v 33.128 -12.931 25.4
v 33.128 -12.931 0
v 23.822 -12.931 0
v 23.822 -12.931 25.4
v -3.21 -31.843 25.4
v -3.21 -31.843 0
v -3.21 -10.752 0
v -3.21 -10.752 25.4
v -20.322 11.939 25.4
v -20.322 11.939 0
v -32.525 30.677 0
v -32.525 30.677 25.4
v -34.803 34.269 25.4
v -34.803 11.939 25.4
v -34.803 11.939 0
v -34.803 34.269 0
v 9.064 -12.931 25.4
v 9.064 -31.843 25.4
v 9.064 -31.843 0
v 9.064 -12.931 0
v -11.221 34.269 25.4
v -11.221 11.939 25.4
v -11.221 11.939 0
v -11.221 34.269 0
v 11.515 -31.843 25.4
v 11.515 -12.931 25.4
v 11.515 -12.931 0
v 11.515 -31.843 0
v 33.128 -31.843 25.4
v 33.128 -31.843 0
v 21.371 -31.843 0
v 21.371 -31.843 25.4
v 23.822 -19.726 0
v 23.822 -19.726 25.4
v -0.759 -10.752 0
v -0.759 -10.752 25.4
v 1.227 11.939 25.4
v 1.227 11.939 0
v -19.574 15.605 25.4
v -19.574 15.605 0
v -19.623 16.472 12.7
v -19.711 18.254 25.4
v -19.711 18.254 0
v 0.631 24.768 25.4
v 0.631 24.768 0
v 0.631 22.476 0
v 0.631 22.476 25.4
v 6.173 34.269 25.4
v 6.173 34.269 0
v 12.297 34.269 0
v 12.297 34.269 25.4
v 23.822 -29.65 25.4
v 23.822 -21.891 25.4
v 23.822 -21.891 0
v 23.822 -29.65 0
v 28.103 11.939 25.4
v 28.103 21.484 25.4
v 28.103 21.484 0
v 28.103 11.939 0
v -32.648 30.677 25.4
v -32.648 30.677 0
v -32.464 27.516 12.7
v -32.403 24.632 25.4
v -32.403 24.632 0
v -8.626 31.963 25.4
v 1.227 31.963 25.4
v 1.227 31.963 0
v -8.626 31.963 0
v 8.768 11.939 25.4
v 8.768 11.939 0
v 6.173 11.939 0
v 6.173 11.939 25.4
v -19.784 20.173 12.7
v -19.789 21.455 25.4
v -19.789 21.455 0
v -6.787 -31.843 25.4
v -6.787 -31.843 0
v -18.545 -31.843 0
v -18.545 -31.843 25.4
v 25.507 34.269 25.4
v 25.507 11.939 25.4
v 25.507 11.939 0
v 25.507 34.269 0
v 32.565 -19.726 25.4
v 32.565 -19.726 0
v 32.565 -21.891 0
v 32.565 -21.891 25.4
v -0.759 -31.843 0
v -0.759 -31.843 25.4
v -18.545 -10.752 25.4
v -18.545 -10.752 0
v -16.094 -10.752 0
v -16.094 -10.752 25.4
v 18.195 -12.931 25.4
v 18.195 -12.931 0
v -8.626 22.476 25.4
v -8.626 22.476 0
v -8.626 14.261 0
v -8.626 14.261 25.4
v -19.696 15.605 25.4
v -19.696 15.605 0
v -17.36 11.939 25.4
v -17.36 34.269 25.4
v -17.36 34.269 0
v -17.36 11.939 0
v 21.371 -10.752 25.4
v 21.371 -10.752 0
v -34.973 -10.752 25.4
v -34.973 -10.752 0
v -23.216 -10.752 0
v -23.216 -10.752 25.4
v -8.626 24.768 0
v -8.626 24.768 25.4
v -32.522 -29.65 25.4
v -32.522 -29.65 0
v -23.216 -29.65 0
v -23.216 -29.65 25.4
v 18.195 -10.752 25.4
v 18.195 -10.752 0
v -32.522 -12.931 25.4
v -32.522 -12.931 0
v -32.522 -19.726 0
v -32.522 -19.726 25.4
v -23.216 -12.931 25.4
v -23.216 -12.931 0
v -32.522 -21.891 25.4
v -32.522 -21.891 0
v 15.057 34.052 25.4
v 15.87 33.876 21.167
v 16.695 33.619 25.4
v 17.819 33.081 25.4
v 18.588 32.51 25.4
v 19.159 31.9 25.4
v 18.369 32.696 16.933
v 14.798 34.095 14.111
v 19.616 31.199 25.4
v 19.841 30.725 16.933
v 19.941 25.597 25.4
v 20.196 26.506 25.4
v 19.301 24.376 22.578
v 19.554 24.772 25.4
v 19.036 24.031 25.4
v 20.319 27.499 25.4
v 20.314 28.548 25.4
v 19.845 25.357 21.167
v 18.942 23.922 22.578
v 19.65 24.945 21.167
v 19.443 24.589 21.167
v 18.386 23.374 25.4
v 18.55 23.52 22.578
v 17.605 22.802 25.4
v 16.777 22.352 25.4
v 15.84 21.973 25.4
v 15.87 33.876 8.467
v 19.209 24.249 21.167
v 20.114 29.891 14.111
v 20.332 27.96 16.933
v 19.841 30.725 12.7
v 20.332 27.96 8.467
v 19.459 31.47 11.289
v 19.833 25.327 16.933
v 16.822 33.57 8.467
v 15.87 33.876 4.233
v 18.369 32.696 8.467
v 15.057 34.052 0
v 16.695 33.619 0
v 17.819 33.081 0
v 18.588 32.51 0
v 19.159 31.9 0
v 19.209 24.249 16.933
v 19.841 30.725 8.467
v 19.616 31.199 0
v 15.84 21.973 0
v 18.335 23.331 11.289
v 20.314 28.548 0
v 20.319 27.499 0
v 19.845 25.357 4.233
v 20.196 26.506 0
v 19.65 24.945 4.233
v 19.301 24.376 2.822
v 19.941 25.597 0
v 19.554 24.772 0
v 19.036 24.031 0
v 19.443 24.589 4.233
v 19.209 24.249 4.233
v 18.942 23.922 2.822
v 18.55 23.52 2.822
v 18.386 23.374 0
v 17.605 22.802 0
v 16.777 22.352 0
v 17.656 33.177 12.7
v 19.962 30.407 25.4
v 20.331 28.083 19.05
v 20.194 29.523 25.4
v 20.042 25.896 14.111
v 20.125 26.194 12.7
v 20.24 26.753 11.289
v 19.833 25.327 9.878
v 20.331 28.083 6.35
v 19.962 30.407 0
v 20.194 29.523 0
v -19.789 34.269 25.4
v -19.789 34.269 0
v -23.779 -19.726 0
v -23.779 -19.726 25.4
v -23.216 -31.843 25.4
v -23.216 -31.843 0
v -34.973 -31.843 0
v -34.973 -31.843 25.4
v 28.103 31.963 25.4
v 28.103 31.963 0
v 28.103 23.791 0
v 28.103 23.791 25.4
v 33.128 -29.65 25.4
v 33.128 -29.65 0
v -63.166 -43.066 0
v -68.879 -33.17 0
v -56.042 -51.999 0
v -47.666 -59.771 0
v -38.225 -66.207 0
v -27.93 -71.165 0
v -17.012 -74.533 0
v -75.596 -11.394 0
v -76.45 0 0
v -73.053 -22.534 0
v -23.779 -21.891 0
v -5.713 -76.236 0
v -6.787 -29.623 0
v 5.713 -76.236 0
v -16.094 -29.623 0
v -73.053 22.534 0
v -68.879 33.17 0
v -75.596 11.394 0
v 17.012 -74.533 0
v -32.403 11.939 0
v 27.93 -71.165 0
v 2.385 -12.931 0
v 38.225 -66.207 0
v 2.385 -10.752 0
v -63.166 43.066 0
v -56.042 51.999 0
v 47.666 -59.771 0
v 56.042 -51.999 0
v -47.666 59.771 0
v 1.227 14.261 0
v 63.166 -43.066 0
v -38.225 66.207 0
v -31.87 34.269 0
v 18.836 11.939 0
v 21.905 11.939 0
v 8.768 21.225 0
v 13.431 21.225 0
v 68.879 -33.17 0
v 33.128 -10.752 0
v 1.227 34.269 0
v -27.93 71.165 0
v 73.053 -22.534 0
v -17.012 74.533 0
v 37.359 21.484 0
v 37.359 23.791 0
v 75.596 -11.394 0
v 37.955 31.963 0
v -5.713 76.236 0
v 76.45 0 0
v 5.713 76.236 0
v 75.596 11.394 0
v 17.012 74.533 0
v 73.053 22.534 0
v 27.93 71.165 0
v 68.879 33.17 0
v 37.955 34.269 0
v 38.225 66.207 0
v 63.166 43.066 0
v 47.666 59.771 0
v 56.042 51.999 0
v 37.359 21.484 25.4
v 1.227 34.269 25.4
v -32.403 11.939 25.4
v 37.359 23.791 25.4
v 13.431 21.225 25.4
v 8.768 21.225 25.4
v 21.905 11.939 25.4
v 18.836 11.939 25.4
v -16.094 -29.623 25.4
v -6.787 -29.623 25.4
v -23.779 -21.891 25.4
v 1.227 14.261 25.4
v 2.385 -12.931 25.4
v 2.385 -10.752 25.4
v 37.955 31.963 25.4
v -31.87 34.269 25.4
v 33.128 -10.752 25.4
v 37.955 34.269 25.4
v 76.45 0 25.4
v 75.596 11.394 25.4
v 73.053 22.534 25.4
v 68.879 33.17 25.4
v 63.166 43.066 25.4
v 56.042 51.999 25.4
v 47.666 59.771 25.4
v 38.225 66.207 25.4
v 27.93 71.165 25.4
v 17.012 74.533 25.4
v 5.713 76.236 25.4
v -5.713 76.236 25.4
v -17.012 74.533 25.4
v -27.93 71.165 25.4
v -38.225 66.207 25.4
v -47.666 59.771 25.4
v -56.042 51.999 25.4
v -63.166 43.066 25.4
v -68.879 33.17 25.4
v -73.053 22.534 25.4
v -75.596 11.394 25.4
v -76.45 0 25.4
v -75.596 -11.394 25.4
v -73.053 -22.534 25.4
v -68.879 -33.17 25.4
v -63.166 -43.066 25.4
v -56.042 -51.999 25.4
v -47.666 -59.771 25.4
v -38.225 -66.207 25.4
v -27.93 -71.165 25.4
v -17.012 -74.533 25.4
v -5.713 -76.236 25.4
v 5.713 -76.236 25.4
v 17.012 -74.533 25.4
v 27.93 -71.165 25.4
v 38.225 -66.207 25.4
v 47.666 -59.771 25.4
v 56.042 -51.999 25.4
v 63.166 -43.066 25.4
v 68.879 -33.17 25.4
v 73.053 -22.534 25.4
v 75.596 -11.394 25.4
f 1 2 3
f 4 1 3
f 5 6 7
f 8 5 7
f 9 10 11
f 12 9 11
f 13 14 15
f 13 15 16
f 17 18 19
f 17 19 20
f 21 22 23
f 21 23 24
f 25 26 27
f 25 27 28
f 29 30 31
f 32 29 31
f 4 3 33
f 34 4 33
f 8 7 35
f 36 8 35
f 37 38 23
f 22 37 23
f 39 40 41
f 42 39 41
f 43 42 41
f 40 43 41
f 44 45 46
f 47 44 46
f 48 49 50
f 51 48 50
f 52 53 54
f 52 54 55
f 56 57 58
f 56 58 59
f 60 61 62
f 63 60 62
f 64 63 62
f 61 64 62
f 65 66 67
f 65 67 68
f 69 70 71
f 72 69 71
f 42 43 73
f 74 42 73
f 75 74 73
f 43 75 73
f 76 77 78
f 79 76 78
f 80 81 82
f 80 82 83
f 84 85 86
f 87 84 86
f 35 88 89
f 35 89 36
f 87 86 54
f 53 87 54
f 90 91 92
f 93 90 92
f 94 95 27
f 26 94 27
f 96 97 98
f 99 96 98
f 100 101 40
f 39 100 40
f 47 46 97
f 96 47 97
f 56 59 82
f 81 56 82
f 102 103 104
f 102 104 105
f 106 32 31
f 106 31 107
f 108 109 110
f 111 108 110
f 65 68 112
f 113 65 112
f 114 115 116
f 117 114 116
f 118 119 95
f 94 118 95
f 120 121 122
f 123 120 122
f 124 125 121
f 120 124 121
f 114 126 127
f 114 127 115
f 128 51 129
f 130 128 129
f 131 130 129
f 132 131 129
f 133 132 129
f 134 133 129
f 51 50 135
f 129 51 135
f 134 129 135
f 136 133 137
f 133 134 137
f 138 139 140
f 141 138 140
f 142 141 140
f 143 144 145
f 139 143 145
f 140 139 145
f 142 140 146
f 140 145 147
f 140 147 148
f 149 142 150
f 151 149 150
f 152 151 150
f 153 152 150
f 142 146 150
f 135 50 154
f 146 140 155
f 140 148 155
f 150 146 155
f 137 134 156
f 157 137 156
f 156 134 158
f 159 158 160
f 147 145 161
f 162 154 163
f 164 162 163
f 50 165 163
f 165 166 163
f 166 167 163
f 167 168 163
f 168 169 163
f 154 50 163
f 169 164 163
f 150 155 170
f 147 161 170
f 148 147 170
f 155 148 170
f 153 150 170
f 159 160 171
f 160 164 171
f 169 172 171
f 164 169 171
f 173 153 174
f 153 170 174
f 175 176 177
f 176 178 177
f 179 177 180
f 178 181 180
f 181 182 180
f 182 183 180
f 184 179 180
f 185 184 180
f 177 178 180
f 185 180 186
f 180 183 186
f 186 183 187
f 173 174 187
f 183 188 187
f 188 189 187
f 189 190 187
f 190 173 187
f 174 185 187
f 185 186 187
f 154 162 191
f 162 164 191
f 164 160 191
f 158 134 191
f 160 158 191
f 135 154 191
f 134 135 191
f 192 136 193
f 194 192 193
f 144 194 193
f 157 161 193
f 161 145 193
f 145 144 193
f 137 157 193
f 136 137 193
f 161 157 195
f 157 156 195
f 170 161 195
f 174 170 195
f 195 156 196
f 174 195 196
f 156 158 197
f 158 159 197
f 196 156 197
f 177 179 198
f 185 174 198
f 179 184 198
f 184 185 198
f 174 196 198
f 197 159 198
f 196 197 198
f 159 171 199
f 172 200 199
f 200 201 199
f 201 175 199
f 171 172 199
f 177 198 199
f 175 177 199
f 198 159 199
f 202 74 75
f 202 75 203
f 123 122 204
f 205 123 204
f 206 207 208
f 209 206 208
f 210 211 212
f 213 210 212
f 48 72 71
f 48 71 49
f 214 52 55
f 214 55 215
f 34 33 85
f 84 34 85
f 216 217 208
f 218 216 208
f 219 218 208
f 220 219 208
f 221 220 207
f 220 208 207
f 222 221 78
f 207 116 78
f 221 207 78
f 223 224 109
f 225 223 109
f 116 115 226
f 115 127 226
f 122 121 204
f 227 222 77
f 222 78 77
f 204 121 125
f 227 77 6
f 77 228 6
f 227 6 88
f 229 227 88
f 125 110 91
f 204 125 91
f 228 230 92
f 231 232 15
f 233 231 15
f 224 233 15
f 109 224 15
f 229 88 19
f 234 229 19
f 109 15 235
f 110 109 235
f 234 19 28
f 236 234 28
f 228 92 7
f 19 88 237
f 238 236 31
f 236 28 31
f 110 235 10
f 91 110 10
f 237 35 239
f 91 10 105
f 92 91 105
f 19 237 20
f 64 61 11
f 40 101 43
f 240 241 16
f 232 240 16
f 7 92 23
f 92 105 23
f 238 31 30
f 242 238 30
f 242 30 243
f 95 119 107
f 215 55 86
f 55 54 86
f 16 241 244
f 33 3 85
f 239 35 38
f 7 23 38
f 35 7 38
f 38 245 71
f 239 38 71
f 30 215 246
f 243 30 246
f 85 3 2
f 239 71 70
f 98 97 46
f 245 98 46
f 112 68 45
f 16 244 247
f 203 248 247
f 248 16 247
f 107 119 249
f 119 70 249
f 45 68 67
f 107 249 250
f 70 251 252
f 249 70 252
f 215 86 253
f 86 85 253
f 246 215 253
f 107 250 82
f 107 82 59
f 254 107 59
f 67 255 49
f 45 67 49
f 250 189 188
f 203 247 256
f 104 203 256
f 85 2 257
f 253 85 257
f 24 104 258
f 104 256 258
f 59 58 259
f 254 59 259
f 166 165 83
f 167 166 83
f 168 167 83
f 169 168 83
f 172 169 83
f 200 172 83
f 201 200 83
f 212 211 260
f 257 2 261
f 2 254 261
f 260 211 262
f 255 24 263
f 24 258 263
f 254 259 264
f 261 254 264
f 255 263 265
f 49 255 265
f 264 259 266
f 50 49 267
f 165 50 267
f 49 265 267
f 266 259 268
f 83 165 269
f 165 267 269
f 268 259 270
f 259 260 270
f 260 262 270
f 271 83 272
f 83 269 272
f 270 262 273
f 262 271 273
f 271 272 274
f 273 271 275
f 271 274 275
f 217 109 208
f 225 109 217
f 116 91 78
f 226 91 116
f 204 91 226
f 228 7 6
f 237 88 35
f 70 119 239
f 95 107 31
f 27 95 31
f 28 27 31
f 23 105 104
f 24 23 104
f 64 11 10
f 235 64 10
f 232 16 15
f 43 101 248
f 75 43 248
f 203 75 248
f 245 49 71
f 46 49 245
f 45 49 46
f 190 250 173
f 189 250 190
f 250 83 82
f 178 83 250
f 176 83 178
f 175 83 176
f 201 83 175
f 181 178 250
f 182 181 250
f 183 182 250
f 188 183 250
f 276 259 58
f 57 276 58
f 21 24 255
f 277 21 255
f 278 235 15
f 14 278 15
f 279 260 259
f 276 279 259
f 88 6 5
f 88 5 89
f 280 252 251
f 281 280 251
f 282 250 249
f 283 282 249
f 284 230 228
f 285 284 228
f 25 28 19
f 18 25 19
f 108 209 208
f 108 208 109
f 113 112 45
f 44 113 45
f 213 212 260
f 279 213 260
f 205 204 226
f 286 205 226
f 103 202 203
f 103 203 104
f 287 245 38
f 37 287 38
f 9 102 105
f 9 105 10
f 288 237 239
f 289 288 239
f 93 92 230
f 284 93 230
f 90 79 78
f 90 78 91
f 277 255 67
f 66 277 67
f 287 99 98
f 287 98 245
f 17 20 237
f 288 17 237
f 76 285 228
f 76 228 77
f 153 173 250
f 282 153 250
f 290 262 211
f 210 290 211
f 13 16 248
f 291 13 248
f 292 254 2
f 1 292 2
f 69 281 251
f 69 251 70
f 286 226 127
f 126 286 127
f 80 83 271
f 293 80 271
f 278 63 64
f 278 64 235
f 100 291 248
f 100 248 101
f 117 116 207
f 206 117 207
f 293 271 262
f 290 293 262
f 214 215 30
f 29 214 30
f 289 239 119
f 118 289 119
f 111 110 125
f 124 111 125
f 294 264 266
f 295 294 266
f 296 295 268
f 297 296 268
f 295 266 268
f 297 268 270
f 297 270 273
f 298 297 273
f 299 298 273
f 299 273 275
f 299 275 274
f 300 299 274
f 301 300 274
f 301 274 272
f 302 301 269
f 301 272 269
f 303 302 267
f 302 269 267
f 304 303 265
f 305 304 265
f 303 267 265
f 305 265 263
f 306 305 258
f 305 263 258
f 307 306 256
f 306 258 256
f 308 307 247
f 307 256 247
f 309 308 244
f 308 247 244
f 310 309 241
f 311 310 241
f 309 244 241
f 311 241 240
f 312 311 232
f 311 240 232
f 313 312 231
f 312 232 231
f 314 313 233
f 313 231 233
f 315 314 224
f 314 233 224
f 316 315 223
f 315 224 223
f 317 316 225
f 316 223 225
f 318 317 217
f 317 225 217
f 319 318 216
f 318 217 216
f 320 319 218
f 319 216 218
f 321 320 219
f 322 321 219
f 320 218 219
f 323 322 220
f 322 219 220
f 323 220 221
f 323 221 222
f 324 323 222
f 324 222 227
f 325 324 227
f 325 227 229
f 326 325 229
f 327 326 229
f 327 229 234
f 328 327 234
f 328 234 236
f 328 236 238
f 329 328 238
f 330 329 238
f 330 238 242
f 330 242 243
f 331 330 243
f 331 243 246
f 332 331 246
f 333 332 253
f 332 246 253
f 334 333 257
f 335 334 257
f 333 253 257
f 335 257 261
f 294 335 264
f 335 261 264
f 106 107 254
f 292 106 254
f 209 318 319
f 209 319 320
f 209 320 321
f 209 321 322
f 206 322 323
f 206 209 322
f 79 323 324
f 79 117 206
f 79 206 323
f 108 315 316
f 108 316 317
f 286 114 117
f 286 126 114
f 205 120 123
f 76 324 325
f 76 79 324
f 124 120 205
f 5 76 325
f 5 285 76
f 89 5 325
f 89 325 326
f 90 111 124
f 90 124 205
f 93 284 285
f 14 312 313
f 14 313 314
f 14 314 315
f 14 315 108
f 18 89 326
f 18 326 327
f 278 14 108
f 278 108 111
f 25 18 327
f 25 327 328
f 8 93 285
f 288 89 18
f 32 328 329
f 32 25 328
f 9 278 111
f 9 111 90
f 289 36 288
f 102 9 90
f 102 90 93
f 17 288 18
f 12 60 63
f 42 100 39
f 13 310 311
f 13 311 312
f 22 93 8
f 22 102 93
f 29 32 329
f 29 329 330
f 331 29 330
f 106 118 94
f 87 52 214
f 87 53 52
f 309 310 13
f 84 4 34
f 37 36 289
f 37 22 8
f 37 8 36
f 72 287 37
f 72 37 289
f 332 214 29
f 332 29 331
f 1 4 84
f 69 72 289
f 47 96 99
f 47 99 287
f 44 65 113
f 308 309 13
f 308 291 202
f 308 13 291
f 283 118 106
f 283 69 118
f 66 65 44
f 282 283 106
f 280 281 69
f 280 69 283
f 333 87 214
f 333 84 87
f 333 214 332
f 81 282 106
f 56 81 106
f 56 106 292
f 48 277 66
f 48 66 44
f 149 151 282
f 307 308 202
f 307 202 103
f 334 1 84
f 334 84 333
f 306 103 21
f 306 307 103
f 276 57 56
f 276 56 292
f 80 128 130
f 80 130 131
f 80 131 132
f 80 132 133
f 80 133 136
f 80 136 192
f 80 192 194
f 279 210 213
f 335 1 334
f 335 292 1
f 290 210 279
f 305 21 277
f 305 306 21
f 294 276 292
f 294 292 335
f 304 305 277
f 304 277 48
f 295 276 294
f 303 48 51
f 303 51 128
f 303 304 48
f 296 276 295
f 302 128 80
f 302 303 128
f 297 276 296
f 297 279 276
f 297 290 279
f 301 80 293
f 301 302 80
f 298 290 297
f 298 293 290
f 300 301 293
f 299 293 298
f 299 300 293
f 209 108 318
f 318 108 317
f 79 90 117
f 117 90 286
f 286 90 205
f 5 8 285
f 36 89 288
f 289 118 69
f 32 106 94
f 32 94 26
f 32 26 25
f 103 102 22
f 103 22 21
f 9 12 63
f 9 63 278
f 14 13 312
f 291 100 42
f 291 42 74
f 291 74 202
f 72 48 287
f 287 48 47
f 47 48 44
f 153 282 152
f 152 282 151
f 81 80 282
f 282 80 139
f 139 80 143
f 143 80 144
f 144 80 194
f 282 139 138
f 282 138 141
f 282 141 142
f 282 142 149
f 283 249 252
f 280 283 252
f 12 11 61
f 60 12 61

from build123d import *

# Parameters (mm, degrees)
F0_R     = 76.4498287505
F0_W     = 2.4511385491
F0_H     = 21.0908701144
F1_DEPTH = 25.4


# Not quite as in the source:
# - a feature names something its author has since deleted; it is built from what else it names


with BuildPart() as f1:
    # F0 (on Top) → F1 (new body)
    with BuildSketch(Plane.XY):
        Circle(F0_R)
        with BuildLine():
            Line((-18.3724183589, -37.9301533103), (-18.3724183589, -42.5397194922))
            ThreePointArc((-18.3724183589, -42.5397194922), (-20.6772014499, -40.2349364012), (-18.3724183589, -37.9301533103))
        make_face(mode=Mode.SUBTRACT)
        Polygon((-23.2161222044, -29.6504020767), (-23.2161222044, -31.8430401385), (-34.9732782957, -31.8430401385), (-34.9732782957, -10.7521700241), (-23.2161222044, -10.7521700241), (-23.2161222044, -12.9309598455), (-32.5221397466, -12.9309598455), (-32.5221397466, -19.725829797), (-23.7792839802, -19.725829797), (-23.7792839802, -21.890771378), (-32.5221397466, -21.890771378), (-32.5221397466, -29.6504020767), align=None, mode=Mode.SUBTRACT)
        Polygon((-6.7874930214, -31.8430401385), (-18.5446491127, -31.8430401385), (-18.5446491127, -10.7521700241), (-16.0935105636, -10.7521700241), (-16.0935105636, -29.6227055959), (-6.7874930214, -29.6227055959), align=None, mode=Mode.SUBTRACT)
        with Locations((-1.984461646, -21.2976050813)):
            Rectangle(F0_W, F0_H, mode=Mode.SUBTRACT)
        Polygon((11.5152646944, -12.9309598455), (11.5152646944, -31.8430401385), (9.0641261454, -31.8430401385), (9.0641261454, -12.9309598455), (2.3846581971, -12.9309598455), (2.3846581971, -10.7521700241), (18.1947326427, -10.7521700241), (18.1947326427, -12.9309598455), align=None, mode=Mode.SUBTRACT)
        Polygon((33.1277518635, -29.6504020767), (33.1277518635, -31.8430401385), (21.3705957722, -31.8430401385), (21.3705957722, -10.7521700241), (33.1277518635, -10.7521700241), (33.1277518635, -12.9309598455), (23.8217343212, -12.9309598455), (23.8217343212, -19.725829797), (32.5645900876, -19.725829797), (32.5645900876, -21.890771378), (23.8217343212, -21.890771378), (23.8217343212, -29.6504020767), align=None, mode=Mode.SUBTRACT)
        with BuildLine():
            Line((-17.3598606786, 34.2694889666), (-17.3598606786, 11.9390692562))
            Line((-17.3598606786, 11.9390692562), (-20.321610371, 11.9390692562))
            Line((-20.321610371, 11.9390692562), (-32.5253875688, 30.677267805))
            Line((-32.5253875688, 30.677267805), (-32.647571962, 30.677267805))
            add(Edge.make_bspline(
                [(-32.647571962, 30.677267805), (-32.4032031755, 27.3782891873), (-32.4032031755, 24.631584027)],
                knots=[0, 0, 0, 1, 1, 1], degree=2))
            Line((-32.4032031755, 24.631584027), (-32.4032031755, 11.9390692562))
            Line((-32.4032031755, 11.9390692562), (-34.8029046589, 11.9390692562))
            Line((-34.8029046589, 11.9390692562), (-34.8029046589, 34.2694889666))
            Line((-34.8029046589, 34.2694889666), (-31.8704792209, 34.2694889666))
            Line((-31.8704792209, 34.2694889666), (-19.6960262775, 15.6046010537))
            Line((-19.6960262775, 15.6046010537), (-19.5738418843, 15.6046010537))
            add(Edge.make_bspline(
                [(-19.5738418843, 15.6046010537), (-19.6031661386, 16.015140615), (-19.7106884047, 18.2535586993)],
                knots=[0, 0, 0, 1, 1, 1], degree=2))
            add(Edge.make_bspline(
                [(-19.7106884047, 18.2535586993), (-19.8182106708, 20.4919767837), (-19.7888864164, 21.4547898025)],
                knots=[0, 0, 0, 1, 1, 1], degree=2))
            Line((-19.7888864164, 21.4547898025), (-19.7888864164, 34.2694889666))
            Line((-19.7888864164, 34.2694889666), (-17.3598606786, 34.2694889666))
        make_face(mode=Mode.SUBTRACT)
        Polygon((1.2268292226, 14.2605727279), (1.2268292226, 11.9390692562), (-11.2213167617, 11.9390692562), (-11.2213167617, 34.2694889666), (1.2268292226, 34.2694889666), (1.2268292226, 31.962647622), (-8.6261202491, 31.962647622), (-8.6261202491, 24.7684305474), (0.6305693836, 24.7684305474), (0.6305693836, 22.4762513301), (-8.6261202491, 22.4762513301), (-8.6261202491, 14.2605727279), align=None, mode=Mode.SUBTRACT)
        with BuildLine():
            Line((13.4306064204, 21.2250831432), (8.768049974, 21.2250831432))
            Line((8.768049974, 21.2250831432), (8.768049974, 11.9390692562))
            Line((8.768049974, 11.9390692562), (6.1728534614, 11.9390692562))
            Line((6.1728534614, 11.9390692562), (6.1728534614, 34.2694889666))
            Line((6.1728534614, 34.2694889666), (12.2967352511, 34.2694889666))
            add(Edge.make_bspline(
                [(12.2967352511, 34.2694889666), (16.40701824, 34.2694889666), (18.3692995956, 32.6957539815)],
                knots=[0, 0, 0, 1, 1, 1], degree=2))
            add(Edge.make_bspline(
                [(18.3692995956, 32.6957539815), (20.3315809512, 31.1220189964), (20.3315809512, 27.9598868991)],
                knots=[0, 0, 0, 1, 1, 1], degree=2))
            add(Edge.make_bspline(
                [(20.3315809512, 27.9598868991), (20.3315809512, 23.5319244877), (15.8400826553, 21.9728516299)],
                knots=[0, 0, 0, 1, 1, 1], degree=2))
            Line((15.8400826553, 21.9728516299), (21.9053159362, 11.9390692562))
            Line((21.9053159362, 11.9390692562), (18.8360439778, 11.9390692562))
            Line((18.8360439778, 11.9390692562), (13.4306064204, 21.2250831432))
        make_face(mode=Mode.SUBTRACT)
        Polygon((28.1025083619, 21.4841140569), (28.1025083619, 11.9390692562), (25.5073118492, 11.9390692562), (25.5073118492, 34.2694889666), (37.9554578336, 34.2694889666), (37.9554578336, 31.962647622), (28.1025083619, 31.962647622), (28.1025083619, 23.7909554014), (37.3591979945, 23.7909554014), (37.3591979945, 21.4841140569), align=None, mode=Mode.SUBTRACT)
        with BuildLine():
            ThreePointArc((-18.3724183589, -37.9301533103), (-20.6772014499, -40.2349364012), (-18.3724183589, -42.5397194922))
            Line((-18.3724183589, -42.5397194922), (-18.3724183589, -37.9301533103))
        make_face()
    extrude(amount=F1_DEPTH)


solid = f1.part
